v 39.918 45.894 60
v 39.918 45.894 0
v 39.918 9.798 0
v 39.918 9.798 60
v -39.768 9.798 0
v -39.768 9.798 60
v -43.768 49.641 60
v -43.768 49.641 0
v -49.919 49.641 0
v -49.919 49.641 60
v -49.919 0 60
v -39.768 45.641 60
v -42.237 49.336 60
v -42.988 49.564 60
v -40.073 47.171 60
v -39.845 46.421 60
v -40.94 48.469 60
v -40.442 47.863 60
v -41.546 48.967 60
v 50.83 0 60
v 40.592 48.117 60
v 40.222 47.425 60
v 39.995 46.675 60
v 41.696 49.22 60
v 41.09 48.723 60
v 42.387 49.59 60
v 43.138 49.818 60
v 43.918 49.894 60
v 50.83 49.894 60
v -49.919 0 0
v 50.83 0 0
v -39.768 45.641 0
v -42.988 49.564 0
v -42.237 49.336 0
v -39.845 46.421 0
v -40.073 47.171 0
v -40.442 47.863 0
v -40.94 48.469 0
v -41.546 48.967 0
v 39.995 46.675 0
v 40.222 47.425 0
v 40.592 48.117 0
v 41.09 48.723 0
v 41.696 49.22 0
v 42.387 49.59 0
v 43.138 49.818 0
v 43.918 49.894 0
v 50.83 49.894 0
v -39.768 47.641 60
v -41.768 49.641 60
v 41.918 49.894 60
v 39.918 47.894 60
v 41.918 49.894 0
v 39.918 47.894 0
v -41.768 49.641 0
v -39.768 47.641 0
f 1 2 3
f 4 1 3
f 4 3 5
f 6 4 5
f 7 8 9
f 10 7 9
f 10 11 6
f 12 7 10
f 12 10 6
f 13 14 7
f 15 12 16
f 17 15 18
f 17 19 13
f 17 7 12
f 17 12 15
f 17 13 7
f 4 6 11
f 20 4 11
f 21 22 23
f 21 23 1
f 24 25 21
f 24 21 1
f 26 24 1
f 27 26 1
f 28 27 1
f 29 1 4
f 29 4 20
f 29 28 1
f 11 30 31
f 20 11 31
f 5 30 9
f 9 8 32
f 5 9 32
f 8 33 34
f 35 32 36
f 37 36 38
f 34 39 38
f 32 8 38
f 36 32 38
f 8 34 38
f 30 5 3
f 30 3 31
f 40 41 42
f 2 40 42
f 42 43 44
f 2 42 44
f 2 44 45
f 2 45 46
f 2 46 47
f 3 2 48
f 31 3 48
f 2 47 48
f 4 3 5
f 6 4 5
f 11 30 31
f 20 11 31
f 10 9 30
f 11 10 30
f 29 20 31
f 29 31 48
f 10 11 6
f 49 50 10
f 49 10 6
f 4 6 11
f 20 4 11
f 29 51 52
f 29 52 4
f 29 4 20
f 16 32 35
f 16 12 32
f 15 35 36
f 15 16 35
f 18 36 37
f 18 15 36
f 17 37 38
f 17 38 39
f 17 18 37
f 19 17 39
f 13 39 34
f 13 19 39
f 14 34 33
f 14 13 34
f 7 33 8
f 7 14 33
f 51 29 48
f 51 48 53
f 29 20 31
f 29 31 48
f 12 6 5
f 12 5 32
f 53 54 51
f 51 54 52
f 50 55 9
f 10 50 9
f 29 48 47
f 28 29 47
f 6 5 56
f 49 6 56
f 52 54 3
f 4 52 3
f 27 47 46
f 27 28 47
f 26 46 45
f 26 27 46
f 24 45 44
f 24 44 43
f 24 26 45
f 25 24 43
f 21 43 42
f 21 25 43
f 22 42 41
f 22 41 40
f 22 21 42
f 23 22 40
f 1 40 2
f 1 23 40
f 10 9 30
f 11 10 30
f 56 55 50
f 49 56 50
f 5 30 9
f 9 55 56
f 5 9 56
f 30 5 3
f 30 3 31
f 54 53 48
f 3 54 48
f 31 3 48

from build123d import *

# Parameters (mm, degrees)
EXTRUDE_DEPTH    = 60
CHAMFER_SIZE     = 2
EXTRUDE001_DEPTH = 60
FILLET_R         = 4


with BuildPart() as chamfer_body:
    # Sketch → Extrude (new body)
    with BuildSketch(Plane.XY):
        Polygon((-49.919125, 49.640652), (-49.919125, 0), (50.830334, 0), (50.830334, 49.894424), (39.917942, 49.894424), (39.917942, 9.797663), (-39.768044, 9.797663), (-39.768044, 49.640652), align=None)
    extrude(amount=EXTRUDE_DEPTH)

    # Chamfer
    chamfer_edges = [chamfer_body.edges().sort_by_distance(p)[0] for p in [
        (-39.768044, 49.640652, 30),
        (39.917942, 49.894424, 30),
    ]]
    chamfer(chamfer_edges, length=CHAMFER_SIZE)


with BuildPart() as fillet_body:
    # Sketch → Extrude001 (new body)
    with BuildSketch(Plane.XY):
        Polygon((-49.919125, 49.640652), (-49.919125, 0), (50.830334, 0), (50.830334, 49.894424), (39.917942, 49.894424), (39.917942, 9.797663), (-39.768044, 9.797663), (-39.768044, 49.640652), align=None)
    extrude(amount=EXTRUDE001_DEPTH)

    # Fillet
    fillet_edges = [fillet_body.edges().sort_by_distance(p)[0] for p in [
        (-39.768044, 49.640652, 30),
        (39.917942, 49.894424, 30),
    ]]
    fillet(fillet_edges, radius=FILLET_R)


solid = Compound([chamfer_body.part, fillet_body.part])
